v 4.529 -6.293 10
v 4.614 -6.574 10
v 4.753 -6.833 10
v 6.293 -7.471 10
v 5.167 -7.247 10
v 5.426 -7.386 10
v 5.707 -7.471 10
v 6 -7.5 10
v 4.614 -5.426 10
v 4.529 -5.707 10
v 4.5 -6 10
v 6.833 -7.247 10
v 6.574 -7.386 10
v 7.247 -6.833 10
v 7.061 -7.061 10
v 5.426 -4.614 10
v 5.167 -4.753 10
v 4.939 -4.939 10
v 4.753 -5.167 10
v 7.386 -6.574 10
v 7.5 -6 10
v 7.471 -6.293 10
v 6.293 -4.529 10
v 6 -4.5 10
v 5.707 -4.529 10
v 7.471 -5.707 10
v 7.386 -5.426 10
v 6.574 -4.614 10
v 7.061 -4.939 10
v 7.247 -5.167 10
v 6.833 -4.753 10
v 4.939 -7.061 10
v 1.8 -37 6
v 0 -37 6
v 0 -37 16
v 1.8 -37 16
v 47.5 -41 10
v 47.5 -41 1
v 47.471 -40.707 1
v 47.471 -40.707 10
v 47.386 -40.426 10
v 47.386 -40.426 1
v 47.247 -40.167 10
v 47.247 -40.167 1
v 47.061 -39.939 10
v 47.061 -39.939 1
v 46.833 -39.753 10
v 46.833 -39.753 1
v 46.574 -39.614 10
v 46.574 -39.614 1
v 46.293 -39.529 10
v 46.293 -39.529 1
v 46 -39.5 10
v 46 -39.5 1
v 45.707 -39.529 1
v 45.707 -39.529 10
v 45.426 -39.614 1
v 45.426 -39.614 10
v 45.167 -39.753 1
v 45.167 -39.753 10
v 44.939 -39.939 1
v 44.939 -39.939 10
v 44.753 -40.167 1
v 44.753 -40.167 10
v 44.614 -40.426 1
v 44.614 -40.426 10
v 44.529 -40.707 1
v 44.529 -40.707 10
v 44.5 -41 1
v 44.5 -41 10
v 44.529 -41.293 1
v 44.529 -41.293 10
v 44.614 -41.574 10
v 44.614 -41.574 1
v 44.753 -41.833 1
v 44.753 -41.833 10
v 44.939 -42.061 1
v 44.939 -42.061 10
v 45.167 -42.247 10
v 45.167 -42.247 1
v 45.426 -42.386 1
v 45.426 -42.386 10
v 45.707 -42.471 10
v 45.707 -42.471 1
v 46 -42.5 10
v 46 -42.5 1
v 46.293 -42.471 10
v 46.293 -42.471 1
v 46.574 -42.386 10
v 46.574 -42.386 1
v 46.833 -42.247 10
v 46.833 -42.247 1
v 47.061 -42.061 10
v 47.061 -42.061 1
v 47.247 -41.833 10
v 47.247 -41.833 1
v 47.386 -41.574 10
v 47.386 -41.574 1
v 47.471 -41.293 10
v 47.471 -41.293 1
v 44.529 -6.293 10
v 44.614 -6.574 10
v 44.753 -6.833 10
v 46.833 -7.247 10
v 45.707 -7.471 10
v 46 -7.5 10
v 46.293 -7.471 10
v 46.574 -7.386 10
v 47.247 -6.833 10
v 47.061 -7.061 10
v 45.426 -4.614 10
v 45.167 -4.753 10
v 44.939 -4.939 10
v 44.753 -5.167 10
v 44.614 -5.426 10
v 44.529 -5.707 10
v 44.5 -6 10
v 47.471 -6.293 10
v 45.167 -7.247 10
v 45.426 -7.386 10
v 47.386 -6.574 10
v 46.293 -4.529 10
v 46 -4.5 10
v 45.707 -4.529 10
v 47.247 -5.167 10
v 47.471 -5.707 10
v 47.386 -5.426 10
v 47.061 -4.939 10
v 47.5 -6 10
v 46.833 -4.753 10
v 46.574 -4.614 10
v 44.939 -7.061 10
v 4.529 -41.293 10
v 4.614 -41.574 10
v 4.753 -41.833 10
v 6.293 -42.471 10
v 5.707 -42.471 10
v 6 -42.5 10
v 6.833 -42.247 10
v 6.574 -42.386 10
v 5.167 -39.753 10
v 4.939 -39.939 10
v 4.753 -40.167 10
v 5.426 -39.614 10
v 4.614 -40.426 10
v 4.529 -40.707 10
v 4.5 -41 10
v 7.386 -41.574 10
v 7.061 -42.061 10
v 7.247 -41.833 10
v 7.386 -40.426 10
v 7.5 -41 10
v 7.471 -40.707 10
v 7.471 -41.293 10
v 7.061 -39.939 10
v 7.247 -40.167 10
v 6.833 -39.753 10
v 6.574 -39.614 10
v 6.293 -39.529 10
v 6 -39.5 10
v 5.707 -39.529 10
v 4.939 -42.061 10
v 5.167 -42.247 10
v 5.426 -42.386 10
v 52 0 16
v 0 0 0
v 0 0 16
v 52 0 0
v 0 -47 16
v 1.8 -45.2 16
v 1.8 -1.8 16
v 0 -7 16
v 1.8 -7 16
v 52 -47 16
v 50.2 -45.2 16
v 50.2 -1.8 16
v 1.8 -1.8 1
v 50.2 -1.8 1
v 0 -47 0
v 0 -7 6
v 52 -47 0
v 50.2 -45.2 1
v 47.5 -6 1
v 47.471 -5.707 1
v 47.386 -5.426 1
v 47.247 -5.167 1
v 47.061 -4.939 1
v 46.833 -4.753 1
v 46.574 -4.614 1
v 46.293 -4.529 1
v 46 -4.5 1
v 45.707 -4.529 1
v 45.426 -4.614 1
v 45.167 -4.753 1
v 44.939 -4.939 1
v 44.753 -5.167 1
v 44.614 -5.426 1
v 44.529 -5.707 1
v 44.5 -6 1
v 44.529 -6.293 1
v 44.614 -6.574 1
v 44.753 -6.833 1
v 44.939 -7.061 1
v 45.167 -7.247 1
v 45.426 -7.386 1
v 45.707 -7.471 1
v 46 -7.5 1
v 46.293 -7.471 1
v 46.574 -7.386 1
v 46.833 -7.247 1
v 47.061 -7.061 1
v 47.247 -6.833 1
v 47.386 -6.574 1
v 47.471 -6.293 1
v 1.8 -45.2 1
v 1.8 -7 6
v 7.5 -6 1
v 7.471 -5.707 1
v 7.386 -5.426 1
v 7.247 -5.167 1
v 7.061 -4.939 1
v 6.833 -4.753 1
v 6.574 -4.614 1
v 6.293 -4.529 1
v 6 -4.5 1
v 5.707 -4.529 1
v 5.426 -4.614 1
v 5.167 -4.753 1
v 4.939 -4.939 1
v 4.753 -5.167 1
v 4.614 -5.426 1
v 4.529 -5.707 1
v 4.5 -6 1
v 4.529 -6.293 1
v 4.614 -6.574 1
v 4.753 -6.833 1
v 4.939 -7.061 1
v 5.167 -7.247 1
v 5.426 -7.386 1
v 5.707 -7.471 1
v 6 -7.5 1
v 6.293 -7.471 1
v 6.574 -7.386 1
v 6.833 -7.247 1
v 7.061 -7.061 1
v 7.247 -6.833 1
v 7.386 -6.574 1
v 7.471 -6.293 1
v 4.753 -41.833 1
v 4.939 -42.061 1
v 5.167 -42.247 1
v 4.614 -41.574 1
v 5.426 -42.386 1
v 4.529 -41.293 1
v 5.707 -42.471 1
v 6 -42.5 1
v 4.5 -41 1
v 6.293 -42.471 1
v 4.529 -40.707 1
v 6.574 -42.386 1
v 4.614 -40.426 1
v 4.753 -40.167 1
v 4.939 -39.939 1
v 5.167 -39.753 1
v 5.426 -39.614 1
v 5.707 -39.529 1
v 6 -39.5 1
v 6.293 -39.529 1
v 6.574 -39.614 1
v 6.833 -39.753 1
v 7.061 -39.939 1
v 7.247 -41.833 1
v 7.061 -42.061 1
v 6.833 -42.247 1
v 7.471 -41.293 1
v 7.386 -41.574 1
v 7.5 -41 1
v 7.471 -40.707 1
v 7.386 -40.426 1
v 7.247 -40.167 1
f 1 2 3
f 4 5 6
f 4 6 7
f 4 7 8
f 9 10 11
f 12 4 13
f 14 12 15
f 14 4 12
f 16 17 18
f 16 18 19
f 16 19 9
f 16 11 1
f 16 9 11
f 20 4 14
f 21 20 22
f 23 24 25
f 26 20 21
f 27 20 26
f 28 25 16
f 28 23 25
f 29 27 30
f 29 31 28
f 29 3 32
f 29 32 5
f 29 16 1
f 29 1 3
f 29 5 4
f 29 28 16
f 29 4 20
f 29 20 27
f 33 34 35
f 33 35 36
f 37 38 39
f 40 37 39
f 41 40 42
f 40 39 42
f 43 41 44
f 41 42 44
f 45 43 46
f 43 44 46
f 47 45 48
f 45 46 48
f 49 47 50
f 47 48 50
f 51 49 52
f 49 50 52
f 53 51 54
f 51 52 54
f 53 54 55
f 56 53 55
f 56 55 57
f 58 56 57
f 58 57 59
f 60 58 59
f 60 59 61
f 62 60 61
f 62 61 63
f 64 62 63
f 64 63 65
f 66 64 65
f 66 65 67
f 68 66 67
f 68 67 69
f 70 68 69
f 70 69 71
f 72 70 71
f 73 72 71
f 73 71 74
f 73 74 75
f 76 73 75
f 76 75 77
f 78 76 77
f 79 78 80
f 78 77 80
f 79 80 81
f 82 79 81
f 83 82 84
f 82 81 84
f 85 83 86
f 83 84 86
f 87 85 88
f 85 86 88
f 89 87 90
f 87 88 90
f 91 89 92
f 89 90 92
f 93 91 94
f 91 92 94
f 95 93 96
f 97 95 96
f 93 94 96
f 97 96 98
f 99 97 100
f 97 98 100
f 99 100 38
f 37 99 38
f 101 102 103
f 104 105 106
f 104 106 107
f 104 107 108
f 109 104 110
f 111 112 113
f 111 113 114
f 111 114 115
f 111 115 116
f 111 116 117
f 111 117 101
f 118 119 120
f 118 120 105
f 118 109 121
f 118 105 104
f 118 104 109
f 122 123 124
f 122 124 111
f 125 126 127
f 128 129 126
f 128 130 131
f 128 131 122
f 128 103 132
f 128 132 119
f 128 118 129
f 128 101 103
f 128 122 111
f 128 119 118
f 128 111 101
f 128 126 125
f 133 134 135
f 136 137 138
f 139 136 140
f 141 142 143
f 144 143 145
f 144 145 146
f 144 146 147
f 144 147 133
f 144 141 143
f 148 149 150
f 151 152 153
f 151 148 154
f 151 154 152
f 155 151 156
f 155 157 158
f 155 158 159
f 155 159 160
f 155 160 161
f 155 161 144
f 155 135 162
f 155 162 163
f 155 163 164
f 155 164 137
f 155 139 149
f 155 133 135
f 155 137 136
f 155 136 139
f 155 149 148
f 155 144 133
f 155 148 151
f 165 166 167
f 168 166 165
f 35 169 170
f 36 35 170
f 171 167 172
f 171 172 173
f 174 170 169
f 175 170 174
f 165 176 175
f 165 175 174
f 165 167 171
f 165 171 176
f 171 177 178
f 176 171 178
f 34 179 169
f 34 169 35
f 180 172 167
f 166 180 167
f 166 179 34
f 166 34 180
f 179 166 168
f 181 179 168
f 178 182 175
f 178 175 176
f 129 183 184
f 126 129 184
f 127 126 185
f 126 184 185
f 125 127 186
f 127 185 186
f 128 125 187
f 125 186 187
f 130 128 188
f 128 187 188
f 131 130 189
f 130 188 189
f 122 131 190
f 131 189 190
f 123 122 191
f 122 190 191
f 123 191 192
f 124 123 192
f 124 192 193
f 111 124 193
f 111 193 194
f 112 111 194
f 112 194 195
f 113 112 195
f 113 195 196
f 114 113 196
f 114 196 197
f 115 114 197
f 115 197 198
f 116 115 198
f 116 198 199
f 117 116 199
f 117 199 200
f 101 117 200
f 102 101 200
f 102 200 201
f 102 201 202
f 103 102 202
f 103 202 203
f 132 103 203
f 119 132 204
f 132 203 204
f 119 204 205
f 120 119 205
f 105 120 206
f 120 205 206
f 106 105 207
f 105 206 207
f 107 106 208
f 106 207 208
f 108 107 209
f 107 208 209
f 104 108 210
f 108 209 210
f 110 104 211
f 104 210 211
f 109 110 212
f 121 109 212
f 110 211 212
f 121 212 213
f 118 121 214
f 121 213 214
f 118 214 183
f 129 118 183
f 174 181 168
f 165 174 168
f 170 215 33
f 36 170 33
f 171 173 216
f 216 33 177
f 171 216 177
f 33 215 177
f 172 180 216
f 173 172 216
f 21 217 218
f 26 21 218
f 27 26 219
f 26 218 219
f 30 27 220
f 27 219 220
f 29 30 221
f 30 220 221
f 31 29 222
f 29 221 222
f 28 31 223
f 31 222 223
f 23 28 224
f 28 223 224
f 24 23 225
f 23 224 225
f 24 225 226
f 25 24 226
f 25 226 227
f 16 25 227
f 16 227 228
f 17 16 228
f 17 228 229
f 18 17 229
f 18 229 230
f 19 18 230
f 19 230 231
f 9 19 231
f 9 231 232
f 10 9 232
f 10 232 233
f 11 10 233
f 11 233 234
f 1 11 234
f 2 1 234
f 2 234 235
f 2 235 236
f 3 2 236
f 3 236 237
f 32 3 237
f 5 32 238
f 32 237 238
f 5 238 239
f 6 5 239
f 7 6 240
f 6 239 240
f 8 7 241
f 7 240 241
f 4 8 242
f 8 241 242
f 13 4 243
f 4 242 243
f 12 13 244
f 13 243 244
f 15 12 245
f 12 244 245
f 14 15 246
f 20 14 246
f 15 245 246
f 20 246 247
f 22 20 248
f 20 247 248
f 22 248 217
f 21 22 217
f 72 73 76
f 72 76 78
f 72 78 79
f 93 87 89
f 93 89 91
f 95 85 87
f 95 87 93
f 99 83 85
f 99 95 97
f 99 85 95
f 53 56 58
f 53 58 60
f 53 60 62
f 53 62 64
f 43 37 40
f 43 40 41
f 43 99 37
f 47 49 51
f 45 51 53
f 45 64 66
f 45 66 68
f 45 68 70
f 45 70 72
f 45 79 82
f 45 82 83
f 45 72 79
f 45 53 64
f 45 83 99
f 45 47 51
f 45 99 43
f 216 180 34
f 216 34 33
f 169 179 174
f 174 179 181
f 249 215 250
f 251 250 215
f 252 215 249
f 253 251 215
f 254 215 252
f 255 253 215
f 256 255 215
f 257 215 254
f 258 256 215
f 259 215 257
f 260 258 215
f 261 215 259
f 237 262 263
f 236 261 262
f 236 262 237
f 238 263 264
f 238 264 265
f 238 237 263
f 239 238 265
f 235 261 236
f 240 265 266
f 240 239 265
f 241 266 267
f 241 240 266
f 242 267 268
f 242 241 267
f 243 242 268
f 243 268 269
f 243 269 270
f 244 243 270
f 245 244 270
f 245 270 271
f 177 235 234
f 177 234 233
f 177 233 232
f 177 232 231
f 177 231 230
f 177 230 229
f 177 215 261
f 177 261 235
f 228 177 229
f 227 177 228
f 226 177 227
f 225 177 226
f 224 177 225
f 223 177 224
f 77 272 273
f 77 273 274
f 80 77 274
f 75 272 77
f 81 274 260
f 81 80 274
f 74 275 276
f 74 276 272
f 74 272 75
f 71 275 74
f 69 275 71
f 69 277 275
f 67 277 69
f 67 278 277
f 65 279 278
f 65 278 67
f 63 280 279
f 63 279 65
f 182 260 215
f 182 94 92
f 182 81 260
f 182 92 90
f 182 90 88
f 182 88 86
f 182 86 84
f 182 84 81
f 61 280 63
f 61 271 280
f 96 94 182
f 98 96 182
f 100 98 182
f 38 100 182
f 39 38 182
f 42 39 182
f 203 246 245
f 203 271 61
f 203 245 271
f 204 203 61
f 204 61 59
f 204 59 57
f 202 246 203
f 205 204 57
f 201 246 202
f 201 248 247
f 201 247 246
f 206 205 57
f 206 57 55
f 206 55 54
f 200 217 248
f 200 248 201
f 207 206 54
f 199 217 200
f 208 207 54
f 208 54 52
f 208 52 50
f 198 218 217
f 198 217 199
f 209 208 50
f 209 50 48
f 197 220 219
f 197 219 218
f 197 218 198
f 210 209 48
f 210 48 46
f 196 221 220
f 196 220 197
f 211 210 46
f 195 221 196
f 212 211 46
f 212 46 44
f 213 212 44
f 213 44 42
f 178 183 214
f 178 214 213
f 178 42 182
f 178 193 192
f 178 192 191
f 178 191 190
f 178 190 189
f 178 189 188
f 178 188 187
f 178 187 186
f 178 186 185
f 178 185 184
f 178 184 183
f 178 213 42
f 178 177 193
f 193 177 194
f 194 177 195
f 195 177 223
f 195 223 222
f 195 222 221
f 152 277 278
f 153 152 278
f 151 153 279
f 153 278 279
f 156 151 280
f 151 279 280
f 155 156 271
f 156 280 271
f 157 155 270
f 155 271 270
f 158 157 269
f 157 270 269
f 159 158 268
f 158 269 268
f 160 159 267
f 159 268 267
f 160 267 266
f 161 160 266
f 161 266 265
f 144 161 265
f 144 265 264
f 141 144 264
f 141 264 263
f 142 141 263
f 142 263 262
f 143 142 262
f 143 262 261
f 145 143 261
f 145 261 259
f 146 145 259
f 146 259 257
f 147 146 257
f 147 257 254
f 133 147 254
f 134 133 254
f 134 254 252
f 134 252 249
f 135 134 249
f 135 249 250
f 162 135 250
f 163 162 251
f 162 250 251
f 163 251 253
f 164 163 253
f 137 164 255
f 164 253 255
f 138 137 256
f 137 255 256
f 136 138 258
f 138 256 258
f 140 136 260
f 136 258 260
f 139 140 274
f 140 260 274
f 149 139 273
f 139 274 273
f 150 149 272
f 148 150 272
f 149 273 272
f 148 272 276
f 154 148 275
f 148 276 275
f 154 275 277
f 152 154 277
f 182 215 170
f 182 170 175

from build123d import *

# Parameters (mm, degrees)
SKETCH016_W     = 52
SKETCH016_H     = 47
SKETCH016_W_2   = 48
SKETCH016_H_2   = 43
PAD006_DEPTH    = 16
SKETCH018_W     = 48
SKETCH018_H     = 43
SKETCH018_R     = 0.5
PAD007_DEPTH    = 1
SKETCH019_R     = 1.5
PAD008_DEPTH    = 10
SKETCH017_W     = 48.4
SKETCH017_H     = 43.4
SKETCH017_W_2   = 45.439167
SKETCH017_H_2   = 40.049149
POCKET005_DEPTH = 15.001
SKETCH020_W     = 2
SKETCH020_H     = 30
POCKET006_DEPTH = 10.001


with BuildPart() as part:
    # Sketch016 → Pad006 (new body)
    with BuildSketch(Plane.XY):
        with Locations((26, 23.5)):
            Rectangle(SKETCH016_W, SKETCH016_H)
        with Locations((26, 23.5)):
            Rectangle(SKETCH016_W_2, SKETCH016_H_2, mode=Mode.SUBTRACT)
    extrude(amount=PAD006_DEPTH)

    # Sketch018 → Pad007 (join)
    with BuildSketch(Plane.XY):
        with Locations((26, 23.5)):
            Rectangle(SKETCH018_W, SKETCH018_H)
        with Locations((6, 41)):
            Circle(SKETCH018_R, mode=Mode.SUBTRACT)
        with Locations((6, 6)):
            Circle(SKETCH018_R, mode=Mode.SUBTRACT)
        with Locations((46, 6)):
            Circle(SKETCH018_R, mode=Mode.SUBTRACT)
        with Locations((46, 41)):
            Circle(SKETCH018_R, mode=Mode.SUBTRACT)
    extrude(amount=PAD007_DEPTH)

    # Sketch019 → Pad008 (join)
    with BuildSketch(Plane.XY):
        with Locations((6, 41)):
            Circle(SKETCH019_R)
        with Locations((6, 6)):
            Circle(SKETCH019_R)
        with Locations((46, 6)):
            Circle(SKETCH019_R)
        with Locations((46, 41)):
            Circle(SKETCH019_R)
    extrude(amount=PAD008_DEPTH)

    # Sketch017 → Pocket005 (cut, through all)
    with BuildSketch(Plane.XY.offset(1)):
        with Locations((26, 23.5)):
            Rectangle(SKETCH017_W, SKETCH017_H)
        with Locations((26.011635, 23.557234)):
            Rectangle(SKETCH017_W_2, SKETCH017_H_2, mode=Mode.SUBTRACT)
    extrude(amount=POCKET005_DEPTH, mode=Mode.SUBTRACT)

    # Sketch020 → Pocket006 (cut, through all)
    with BuildSketch(Plane.XY.offset(6)):
        with Locations((1, 25)):
            Rectangle(SKETCH020_W, SKETCH020_H)
    extrude(amount=POCKET006_DEPTH, mode=Mode.SUBTRACT)


with BuildPart() as part_1:
    # Body003 placement: moved
    add(part.part.moved(Location((0, -47, 0))))


solid = part_1.part
